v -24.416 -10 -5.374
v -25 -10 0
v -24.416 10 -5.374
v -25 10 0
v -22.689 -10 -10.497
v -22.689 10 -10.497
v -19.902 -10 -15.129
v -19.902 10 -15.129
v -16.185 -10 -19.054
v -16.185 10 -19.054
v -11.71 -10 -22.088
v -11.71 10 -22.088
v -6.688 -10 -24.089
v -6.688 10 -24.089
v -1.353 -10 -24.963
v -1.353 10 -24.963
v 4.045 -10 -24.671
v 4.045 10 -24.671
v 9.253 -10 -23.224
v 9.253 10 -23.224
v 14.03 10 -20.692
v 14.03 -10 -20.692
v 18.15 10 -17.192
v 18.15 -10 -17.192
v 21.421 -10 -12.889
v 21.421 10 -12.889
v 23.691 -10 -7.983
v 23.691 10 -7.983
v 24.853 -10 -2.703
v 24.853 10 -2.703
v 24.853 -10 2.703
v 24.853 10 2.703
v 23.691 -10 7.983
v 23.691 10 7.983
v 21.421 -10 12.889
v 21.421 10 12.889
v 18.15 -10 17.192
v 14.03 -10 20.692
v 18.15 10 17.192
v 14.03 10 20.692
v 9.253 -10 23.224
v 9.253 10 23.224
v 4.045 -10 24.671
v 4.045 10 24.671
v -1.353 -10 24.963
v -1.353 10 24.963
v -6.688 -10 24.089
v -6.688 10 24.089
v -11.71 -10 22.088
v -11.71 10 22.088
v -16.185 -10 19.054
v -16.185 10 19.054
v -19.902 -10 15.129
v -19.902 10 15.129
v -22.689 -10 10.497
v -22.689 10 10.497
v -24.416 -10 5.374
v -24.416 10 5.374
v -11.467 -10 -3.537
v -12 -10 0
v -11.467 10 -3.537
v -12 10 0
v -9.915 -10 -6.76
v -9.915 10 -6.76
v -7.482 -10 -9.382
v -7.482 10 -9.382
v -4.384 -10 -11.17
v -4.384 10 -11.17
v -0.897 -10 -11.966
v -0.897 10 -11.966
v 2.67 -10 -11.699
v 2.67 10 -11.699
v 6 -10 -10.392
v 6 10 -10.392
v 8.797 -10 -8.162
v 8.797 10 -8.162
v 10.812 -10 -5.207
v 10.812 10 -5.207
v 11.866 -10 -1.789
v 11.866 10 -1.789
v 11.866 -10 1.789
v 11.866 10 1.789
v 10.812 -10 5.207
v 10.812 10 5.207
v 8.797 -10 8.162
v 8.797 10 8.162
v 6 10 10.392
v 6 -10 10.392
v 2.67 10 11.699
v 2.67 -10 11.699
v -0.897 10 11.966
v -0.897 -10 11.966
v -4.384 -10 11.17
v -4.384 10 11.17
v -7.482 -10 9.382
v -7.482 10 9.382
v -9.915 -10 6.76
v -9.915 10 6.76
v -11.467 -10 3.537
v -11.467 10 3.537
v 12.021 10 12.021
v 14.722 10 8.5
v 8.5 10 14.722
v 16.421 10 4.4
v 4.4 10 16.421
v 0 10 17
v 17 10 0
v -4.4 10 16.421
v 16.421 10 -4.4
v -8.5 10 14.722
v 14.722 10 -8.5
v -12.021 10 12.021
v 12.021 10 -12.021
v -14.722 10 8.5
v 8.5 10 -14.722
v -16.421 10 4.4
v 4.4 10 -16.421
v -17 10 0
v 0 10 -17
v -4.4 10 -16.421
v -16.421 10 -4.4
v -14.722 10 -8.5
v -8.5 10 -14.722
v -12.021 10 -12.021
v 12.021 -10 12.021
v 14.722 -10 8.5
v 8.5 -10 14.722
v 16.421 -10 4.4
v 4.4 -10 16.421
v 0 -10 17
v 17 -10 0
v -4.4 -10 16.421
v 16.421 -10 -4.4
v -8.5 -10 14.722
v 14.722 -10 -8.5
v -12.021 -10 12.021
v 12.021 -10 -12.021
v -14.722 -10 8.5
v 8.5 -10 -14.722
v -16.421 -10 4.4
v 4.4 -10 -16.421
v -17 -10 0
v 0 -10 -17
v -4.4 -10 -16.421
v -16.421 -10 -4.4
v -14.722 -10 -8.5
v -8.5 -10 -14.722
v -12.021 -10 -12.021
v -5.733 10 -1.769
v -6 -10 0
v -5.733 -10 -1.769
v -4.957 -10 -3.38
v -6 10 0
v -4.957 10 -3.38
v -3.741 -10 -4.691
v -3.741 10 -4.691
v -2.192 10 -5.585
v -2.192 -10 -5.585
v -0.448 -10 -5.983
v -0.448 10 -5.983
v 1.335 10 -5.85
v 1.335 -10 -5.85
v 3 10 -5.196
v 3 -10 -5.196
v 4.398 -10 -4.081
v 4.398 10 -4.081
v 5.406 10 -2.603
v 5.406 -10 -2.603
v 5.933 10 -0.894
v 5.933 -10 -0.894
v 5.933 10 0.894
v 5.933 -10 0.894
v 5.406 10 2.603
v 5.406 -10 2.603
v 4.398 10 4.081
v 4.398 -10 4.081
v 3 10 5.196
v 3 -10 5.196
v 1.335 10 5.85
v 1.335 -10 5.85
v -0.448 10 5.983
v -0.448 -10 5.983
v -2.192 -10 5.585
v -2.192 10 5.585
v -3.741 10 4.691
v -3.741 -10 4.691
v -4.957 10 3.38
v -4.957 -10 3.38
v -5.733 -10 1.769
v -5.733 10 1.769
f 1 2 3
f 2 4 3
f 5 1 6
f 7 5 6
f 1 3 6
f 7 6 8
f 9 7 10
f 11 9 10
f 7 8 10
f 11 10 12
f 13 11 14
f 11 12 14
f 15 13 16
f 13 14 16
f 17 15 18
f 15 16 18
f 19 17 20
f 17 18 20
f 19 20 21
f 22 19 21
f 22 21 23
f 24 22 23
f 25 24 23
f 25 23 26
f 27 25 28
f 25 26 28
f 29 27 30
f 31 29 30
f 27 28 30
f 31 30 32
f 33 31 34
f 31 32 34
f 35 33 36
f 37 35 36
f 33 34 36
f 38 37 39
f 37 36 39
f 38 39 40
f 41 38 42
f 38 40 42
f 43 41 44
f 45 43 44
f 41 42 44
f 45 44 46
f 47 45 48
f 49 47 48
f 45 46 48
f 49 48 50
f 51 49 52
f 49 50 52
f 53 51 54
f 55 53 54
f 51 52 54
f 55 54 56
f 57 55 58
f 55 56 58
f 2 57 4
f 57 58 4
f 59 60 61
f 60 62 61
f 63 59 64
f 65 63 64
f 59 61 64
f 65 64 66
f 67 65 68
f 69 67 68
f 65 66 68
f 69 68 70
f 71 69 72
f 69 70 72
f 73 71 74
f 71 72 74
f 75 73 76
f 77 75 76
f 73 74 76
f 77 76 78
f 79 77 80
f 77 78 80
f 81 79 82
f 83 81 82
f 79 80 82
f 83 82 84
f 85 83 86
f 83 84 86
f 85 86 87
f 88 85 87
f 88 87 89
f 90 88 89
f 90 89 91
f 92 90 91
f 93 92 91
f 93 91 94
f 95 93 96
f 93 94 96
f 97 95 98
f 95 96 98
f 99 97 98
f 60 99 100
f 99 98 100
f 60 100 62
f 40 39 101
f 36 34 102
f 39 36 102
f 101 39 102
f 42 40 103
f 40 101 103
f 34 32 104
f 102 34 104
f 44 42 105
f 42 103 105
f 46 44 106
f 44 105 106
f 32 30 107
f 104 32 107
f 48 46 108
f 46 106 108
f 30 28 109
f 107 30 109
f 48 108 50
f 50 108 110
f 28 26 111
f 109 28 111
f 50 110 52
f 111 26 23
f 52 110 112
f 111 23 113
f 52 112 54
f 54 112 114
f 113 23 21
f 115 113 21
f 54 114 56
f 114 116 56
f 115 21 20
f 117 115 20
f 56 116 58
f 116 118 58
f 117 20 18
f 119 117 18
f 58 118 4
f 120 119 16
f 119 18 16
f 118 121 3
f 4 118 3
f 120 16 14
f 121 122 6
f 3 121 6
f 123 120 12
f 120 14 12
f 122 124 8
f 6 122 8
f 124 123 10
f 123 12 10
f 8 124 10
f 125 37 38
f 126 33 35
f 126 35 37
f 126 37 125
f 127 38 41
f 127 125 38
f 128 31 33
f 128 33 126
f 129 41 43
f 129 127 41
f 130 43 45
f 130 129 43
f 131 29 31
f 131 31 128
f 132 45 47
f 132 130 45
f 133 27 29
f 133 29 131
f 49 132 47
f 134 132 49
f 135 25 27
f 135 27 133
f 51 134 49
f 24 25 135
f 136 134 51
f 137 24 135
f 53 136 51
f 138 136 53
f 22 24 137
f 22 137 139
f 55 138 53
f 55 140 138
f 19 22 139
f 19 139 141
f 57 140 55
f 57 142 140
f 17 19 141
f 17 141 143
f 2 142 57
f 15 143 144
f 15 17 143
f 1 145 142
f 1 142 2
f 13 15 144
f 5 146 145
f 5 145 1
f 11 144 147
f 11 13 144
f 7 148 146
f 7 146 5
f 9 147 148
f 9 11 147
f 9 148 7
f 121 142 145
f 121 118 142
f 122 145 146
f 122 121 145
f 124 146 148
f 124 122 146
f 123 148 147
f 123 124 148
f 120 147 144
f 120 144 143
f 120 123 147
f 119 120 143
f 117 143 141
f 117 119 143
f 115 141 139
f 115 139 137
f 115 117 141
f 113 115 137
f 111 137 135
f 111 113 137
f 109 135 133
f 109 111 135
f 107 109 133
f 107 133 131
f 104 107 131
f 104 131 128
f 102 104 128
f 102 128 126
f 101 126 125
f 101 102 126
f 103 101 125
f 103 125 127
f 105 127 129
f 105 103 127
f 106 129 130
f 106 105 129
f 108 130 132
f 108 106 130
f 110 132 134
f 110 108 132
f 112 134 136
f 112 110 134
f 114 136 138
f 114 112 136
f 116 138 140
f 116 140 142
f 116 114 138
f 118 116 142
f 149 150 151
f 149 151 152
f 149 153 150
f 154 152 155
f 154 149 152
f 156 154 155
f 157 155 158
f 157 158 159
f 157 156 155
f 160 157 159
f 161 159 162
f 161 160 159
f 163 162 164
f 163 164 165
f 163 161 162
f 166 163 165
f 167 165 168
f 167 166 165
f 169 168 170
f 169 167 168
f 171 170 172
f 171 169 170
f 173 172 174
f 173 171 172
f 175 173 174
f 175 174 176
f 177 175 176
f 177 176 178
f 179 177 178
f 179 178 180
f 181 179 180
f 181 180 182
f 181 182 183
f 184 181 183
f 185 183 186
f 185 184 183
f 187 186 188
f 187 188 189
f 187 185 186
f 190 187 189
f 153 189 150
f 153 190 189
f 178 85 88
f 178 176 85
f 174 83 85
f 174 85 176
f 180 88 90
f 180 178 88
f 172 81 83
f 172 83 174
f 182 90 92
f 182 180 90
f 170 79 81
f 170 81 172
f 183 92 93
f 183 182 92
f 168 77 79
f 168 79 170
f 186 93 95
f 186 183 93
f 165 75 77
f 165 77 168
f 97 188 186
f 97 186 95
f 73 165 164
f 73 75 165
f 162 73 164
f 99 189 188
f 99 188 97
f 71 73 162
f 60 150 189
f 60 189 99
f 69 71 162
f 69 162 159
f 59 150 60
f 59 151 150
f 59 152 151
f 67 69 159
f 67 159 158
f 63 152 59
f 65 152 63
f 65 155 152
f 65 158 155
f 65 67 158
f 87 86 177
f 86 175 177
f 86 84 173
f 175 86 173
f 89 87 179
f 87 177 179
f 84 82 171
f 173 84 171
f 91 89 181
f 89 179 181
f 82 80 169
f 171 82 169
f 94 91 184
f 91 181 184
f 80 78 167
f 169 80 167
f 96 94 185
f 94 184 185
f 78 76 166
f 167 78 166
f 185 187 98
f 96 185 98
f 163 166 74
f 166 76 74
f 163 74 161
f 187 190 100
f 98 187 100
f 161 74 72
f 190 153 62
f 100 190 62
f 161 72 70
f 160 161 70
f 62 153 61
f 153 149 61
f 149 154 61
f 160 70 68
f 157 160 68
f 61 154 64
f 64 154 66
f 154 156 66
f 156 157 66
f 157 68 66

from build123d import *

# Parameters (mm, degrees)
F0_W = 8
F0_H = 20
F3_W = 6
F3_H = 20


with BuildPart() as f2:
    # F0 (on Top) → F2 (revolve)
    with BuildSketch(Plane.XY):
        with Locations((-21, 0)):
            Rectangle(F0_W, F0_H)
    revolve(axis=Axis((0, -1.9382, 0), (0, -1, 0)))


with BuildPart() as f4:
    # F3 (on Top) → F4 (revolve)
    with BuildSketch(Plane.XY):
        with Locations((-9, 0)):
            Rectangle(F3_W, F3_H)
    revolve(axis=Axis((0, -1.9382, 0), (0, -1, 0)))


solid = Compound([f2.part, f4.part])
